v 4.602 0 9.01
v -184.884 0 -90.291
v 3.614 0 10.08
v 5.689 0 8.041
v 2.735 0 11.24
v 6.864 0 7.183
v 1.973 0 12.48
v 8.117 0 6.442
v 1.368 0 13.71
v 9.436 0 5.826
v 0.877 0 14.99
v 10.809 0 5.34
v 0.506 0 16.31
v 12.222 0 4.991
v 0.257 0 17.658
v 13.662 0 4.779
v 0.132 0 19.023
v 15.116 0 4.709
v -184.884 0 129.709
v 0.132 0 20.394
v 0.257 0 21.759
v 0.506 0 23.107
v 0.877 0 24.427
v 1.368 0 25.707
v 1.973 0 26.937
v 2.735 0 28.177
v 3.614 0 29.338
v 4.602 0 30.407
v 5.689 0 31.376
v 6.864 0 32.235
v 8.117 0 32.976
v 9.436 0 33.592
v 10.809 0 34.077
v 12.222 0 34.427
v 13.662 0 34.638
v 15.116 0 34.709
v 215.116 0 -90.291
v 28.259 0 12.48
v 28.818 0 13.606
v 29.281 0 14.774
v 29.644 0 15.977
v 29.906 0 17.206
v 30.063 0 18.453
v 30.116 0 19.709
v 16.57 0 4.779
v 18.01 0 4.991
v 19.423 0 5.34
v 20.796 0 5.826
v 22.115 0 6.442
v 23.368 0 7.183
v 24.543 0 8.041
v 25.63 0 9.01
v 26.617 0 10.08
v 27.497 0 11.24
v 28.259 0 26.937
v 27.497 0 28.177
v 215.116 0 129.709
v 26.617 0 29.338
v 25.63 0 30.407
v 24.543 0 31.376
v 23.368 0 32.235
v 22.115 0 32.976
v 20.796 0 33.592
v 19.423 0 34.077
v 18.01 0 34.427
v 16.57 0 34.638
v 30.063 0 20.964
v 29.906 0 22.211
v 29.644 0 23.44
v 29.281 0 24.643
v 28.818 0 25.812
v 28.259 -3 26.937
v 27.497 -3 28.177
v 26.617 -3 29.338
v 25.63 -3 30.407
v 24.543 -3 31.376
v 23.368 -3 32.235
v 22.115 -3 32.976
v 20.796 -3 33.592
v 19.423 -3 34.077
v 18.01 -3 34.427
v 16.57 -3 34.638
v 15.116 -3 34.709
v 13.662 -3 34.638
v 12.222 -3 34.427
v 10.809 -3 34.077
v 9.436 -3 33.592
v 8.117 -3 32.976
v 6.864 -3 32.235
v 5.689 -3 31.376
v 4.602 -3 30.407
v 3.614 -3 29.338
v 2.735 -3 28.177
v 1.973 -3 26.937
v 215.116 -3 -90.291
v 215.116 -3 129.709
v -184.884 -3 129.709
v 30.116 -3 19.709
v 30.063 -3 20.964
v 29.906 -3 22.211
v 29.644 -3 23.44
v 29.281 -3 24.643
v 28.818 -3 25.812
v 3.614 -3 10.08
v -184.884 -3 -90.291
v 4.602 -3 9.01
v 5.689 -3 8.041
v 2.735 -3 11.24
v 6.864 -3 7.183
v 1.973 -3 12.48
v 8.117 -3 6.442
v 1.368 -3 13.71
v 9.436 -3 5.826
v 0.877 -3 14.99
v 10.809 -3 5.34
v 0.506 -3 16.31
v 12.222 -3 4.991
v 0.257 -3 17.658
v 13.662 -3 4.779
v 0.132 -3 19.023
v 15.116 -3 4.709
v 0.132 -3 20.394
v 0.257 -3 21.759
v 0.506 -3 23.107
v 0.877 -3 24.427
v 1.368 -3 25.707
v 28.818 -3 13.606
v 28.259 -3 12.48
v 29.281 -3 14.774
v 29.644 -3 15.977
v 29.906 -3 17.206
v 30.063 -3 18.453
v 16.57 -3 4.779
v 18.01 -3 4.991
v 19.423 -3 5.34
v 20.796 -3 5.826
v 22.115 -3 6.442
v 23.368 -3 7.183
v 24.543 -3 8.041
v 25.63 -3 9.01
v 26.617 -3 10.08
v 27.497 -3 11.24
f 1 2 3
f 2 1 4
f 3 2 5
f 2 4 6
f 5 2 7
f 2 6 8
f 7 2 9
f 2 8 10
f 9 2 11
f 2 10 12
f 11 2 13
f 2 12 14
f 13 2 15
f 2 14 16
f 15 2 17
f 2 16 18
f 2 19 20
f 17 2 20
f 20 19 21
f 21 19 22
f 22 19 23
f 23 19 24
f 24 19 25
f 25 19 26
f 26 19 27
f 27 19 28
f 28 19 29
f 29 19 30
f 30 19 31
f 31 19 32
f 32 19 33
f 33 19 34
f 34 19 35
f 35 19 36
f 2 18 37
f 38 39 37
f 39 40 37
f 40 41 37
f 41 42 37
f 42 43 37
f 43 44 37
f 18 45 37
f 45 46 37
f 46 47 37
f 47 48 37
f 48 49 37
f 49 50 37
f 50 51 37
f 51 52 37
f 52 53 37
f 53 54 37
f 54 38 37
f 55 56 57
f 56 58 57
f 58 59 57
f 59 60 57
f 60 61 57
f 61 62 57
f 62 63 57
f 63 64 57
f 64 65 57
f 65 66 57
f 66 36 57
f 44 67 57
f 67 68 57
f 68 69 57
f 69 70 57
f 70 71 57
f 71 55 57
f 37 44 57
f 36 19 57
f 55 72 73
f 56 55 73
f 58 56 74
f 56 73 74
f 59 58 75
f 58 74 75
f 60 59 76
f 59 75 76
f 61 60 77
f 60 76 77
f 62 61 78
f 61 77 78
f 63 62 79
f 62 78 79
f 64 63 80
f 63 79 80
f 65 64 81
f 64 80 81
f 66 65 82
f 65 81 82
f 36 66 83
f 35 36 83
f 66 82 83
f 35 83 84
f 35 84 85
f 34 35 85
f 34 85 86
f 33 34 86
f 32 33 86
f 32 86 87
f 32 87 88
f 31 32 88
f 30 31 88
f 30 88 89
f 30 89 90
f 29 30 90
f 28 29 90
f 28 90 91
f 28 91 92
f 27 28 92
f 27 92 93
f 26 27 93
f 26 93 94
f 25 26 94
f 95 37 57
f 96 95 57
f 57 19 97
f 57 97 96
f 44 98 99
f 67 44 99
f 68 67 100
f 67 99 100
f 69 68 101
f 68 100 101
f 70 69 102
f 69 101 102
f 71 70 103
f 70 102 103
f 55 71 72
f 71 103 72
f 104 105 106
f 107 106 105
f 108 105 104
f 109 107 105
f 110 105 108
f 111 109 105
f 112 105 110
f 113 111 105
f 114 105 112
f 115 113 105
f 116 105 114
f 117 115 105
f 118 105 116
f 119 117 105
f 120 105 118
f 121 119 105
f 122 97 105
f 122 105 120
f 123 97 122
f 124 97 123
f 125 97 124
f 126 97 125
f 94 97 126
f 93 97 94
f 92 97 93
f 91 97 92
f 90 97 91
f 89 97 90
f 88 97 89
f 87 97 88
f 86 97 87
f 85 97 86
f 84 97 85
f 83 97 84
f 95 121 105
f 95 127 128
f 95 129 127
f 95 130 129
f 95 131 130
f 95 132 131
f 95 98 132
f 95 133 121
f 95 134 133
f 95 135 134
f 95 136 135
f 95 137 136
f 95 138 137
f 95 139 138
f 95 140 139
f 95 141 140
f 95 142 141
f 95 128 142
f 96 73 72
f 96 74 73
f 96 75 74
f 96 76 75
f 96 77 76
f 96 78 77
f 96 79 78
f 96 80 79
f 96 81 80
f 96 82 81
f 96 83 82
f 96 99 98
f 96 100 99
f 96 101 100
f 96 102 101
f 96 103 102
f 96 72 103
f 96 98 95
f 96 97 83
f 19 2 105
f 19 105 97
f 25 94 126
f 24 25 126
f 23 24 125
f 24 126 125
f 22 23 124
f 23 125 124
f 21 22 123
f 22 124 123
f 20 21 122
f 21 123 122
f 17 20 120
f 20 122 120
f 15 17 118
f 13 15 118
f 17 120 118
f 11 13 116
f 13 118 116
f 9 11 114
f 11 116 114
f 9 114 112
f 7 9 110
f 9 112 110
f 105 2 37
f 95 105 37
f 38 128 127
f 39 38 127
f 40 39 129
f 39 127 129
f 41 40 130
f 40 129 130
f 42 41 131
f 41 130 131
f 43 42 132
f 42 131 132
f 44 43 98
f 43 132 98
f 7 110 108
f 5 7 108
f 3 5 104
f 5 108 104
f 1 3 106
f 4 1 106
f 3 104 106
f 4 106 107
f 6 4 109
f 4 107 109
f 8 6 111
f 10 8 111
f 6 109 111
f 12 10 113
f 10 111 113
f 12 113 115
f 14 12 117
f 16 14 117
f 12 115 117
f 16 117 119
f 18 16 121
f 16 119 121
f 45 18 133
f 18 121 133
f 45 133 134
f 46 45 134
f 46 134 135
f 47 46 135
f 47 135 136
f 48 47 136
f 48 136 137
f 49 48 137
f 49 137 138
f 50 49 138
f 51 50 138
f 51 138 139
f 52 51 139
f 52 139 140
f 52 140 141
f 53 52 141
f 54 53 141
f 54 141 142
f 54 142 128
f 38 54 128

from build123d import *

# Parameters (mm, degrees)
F0_W     = 400
F0_H     = 220
F1_DEPTH = 3
F3_DEPTH = 35.56


with BuildPart() as f1:
    # F0 (on Front) → F1 (new body)
    with BuildSketch(Plane.XZ):
        with Locations((15.115904808, 19.7087159753)):
            Rectangle(F0_W, F0_H)
    extrude(amount=F1_DEPTH)

    # F2 (on face) → F3 (cut)
    with BuildSketch(Plane.XZ.offset(3)):
        with BuildLine():
            ThreePointArc((28.2591434382, 26.9374972219), (15.115904808, 34.7087159753), (1.9726661779, 26.9374972219))
            Line((1.9726661779, 26.9374972219), (15.115904808, 19.7087159753))
            Line((15.115904808, 19.7087159753), (28.2591434382, 26.9374972219))
        make_face()
        with BuildLine():
            Line((15.115904808, 19.7087159753), (1.9726661779, 12.4799347287))
            ThreePointArc((1.9726661779, 12.4799347287), (15.115904808, 4.7087159753), (28.2591434382, 12.4799347287))
            Line((28.2591434382, 12.4799347287), (15.115904808, 19.7087159753))
        make_face()
        with BuildLine():
            ThreePointArc((30.115904808, 19.7087159753), (29.6443007872, 23.4404327751), (28.2591434382, 26.9374972219))
            Line((28.2591434382, 26.9374972219), (15.115904808, 19.7087159753))
            Line((15.115904808, 19.7087159753), (28.2591434382, 12.4799347287))
            ThreePointArc((28.2591434382, 12.4799347287), (29.6443007872, 15.9769991755), (30.115904808, 19.7087159753))
        make_face()
        with BuildLine():
            Line((15.115904808, 19.7087159753), (1.9726661779, 26.9374972219))
            ThreePointArc((1.9726661779, 26.9374972219), (0.115904808, 19.7087159753), (1.9726661779, 12.4799347287))
            Line((1.9726661779, 12.4799347287), (15.115904808, 19.7087159753))
        make_face()
    extrude(amount=-F3_DEPTH, mode=Mode.SUBTRACT)


solid = f1.part
